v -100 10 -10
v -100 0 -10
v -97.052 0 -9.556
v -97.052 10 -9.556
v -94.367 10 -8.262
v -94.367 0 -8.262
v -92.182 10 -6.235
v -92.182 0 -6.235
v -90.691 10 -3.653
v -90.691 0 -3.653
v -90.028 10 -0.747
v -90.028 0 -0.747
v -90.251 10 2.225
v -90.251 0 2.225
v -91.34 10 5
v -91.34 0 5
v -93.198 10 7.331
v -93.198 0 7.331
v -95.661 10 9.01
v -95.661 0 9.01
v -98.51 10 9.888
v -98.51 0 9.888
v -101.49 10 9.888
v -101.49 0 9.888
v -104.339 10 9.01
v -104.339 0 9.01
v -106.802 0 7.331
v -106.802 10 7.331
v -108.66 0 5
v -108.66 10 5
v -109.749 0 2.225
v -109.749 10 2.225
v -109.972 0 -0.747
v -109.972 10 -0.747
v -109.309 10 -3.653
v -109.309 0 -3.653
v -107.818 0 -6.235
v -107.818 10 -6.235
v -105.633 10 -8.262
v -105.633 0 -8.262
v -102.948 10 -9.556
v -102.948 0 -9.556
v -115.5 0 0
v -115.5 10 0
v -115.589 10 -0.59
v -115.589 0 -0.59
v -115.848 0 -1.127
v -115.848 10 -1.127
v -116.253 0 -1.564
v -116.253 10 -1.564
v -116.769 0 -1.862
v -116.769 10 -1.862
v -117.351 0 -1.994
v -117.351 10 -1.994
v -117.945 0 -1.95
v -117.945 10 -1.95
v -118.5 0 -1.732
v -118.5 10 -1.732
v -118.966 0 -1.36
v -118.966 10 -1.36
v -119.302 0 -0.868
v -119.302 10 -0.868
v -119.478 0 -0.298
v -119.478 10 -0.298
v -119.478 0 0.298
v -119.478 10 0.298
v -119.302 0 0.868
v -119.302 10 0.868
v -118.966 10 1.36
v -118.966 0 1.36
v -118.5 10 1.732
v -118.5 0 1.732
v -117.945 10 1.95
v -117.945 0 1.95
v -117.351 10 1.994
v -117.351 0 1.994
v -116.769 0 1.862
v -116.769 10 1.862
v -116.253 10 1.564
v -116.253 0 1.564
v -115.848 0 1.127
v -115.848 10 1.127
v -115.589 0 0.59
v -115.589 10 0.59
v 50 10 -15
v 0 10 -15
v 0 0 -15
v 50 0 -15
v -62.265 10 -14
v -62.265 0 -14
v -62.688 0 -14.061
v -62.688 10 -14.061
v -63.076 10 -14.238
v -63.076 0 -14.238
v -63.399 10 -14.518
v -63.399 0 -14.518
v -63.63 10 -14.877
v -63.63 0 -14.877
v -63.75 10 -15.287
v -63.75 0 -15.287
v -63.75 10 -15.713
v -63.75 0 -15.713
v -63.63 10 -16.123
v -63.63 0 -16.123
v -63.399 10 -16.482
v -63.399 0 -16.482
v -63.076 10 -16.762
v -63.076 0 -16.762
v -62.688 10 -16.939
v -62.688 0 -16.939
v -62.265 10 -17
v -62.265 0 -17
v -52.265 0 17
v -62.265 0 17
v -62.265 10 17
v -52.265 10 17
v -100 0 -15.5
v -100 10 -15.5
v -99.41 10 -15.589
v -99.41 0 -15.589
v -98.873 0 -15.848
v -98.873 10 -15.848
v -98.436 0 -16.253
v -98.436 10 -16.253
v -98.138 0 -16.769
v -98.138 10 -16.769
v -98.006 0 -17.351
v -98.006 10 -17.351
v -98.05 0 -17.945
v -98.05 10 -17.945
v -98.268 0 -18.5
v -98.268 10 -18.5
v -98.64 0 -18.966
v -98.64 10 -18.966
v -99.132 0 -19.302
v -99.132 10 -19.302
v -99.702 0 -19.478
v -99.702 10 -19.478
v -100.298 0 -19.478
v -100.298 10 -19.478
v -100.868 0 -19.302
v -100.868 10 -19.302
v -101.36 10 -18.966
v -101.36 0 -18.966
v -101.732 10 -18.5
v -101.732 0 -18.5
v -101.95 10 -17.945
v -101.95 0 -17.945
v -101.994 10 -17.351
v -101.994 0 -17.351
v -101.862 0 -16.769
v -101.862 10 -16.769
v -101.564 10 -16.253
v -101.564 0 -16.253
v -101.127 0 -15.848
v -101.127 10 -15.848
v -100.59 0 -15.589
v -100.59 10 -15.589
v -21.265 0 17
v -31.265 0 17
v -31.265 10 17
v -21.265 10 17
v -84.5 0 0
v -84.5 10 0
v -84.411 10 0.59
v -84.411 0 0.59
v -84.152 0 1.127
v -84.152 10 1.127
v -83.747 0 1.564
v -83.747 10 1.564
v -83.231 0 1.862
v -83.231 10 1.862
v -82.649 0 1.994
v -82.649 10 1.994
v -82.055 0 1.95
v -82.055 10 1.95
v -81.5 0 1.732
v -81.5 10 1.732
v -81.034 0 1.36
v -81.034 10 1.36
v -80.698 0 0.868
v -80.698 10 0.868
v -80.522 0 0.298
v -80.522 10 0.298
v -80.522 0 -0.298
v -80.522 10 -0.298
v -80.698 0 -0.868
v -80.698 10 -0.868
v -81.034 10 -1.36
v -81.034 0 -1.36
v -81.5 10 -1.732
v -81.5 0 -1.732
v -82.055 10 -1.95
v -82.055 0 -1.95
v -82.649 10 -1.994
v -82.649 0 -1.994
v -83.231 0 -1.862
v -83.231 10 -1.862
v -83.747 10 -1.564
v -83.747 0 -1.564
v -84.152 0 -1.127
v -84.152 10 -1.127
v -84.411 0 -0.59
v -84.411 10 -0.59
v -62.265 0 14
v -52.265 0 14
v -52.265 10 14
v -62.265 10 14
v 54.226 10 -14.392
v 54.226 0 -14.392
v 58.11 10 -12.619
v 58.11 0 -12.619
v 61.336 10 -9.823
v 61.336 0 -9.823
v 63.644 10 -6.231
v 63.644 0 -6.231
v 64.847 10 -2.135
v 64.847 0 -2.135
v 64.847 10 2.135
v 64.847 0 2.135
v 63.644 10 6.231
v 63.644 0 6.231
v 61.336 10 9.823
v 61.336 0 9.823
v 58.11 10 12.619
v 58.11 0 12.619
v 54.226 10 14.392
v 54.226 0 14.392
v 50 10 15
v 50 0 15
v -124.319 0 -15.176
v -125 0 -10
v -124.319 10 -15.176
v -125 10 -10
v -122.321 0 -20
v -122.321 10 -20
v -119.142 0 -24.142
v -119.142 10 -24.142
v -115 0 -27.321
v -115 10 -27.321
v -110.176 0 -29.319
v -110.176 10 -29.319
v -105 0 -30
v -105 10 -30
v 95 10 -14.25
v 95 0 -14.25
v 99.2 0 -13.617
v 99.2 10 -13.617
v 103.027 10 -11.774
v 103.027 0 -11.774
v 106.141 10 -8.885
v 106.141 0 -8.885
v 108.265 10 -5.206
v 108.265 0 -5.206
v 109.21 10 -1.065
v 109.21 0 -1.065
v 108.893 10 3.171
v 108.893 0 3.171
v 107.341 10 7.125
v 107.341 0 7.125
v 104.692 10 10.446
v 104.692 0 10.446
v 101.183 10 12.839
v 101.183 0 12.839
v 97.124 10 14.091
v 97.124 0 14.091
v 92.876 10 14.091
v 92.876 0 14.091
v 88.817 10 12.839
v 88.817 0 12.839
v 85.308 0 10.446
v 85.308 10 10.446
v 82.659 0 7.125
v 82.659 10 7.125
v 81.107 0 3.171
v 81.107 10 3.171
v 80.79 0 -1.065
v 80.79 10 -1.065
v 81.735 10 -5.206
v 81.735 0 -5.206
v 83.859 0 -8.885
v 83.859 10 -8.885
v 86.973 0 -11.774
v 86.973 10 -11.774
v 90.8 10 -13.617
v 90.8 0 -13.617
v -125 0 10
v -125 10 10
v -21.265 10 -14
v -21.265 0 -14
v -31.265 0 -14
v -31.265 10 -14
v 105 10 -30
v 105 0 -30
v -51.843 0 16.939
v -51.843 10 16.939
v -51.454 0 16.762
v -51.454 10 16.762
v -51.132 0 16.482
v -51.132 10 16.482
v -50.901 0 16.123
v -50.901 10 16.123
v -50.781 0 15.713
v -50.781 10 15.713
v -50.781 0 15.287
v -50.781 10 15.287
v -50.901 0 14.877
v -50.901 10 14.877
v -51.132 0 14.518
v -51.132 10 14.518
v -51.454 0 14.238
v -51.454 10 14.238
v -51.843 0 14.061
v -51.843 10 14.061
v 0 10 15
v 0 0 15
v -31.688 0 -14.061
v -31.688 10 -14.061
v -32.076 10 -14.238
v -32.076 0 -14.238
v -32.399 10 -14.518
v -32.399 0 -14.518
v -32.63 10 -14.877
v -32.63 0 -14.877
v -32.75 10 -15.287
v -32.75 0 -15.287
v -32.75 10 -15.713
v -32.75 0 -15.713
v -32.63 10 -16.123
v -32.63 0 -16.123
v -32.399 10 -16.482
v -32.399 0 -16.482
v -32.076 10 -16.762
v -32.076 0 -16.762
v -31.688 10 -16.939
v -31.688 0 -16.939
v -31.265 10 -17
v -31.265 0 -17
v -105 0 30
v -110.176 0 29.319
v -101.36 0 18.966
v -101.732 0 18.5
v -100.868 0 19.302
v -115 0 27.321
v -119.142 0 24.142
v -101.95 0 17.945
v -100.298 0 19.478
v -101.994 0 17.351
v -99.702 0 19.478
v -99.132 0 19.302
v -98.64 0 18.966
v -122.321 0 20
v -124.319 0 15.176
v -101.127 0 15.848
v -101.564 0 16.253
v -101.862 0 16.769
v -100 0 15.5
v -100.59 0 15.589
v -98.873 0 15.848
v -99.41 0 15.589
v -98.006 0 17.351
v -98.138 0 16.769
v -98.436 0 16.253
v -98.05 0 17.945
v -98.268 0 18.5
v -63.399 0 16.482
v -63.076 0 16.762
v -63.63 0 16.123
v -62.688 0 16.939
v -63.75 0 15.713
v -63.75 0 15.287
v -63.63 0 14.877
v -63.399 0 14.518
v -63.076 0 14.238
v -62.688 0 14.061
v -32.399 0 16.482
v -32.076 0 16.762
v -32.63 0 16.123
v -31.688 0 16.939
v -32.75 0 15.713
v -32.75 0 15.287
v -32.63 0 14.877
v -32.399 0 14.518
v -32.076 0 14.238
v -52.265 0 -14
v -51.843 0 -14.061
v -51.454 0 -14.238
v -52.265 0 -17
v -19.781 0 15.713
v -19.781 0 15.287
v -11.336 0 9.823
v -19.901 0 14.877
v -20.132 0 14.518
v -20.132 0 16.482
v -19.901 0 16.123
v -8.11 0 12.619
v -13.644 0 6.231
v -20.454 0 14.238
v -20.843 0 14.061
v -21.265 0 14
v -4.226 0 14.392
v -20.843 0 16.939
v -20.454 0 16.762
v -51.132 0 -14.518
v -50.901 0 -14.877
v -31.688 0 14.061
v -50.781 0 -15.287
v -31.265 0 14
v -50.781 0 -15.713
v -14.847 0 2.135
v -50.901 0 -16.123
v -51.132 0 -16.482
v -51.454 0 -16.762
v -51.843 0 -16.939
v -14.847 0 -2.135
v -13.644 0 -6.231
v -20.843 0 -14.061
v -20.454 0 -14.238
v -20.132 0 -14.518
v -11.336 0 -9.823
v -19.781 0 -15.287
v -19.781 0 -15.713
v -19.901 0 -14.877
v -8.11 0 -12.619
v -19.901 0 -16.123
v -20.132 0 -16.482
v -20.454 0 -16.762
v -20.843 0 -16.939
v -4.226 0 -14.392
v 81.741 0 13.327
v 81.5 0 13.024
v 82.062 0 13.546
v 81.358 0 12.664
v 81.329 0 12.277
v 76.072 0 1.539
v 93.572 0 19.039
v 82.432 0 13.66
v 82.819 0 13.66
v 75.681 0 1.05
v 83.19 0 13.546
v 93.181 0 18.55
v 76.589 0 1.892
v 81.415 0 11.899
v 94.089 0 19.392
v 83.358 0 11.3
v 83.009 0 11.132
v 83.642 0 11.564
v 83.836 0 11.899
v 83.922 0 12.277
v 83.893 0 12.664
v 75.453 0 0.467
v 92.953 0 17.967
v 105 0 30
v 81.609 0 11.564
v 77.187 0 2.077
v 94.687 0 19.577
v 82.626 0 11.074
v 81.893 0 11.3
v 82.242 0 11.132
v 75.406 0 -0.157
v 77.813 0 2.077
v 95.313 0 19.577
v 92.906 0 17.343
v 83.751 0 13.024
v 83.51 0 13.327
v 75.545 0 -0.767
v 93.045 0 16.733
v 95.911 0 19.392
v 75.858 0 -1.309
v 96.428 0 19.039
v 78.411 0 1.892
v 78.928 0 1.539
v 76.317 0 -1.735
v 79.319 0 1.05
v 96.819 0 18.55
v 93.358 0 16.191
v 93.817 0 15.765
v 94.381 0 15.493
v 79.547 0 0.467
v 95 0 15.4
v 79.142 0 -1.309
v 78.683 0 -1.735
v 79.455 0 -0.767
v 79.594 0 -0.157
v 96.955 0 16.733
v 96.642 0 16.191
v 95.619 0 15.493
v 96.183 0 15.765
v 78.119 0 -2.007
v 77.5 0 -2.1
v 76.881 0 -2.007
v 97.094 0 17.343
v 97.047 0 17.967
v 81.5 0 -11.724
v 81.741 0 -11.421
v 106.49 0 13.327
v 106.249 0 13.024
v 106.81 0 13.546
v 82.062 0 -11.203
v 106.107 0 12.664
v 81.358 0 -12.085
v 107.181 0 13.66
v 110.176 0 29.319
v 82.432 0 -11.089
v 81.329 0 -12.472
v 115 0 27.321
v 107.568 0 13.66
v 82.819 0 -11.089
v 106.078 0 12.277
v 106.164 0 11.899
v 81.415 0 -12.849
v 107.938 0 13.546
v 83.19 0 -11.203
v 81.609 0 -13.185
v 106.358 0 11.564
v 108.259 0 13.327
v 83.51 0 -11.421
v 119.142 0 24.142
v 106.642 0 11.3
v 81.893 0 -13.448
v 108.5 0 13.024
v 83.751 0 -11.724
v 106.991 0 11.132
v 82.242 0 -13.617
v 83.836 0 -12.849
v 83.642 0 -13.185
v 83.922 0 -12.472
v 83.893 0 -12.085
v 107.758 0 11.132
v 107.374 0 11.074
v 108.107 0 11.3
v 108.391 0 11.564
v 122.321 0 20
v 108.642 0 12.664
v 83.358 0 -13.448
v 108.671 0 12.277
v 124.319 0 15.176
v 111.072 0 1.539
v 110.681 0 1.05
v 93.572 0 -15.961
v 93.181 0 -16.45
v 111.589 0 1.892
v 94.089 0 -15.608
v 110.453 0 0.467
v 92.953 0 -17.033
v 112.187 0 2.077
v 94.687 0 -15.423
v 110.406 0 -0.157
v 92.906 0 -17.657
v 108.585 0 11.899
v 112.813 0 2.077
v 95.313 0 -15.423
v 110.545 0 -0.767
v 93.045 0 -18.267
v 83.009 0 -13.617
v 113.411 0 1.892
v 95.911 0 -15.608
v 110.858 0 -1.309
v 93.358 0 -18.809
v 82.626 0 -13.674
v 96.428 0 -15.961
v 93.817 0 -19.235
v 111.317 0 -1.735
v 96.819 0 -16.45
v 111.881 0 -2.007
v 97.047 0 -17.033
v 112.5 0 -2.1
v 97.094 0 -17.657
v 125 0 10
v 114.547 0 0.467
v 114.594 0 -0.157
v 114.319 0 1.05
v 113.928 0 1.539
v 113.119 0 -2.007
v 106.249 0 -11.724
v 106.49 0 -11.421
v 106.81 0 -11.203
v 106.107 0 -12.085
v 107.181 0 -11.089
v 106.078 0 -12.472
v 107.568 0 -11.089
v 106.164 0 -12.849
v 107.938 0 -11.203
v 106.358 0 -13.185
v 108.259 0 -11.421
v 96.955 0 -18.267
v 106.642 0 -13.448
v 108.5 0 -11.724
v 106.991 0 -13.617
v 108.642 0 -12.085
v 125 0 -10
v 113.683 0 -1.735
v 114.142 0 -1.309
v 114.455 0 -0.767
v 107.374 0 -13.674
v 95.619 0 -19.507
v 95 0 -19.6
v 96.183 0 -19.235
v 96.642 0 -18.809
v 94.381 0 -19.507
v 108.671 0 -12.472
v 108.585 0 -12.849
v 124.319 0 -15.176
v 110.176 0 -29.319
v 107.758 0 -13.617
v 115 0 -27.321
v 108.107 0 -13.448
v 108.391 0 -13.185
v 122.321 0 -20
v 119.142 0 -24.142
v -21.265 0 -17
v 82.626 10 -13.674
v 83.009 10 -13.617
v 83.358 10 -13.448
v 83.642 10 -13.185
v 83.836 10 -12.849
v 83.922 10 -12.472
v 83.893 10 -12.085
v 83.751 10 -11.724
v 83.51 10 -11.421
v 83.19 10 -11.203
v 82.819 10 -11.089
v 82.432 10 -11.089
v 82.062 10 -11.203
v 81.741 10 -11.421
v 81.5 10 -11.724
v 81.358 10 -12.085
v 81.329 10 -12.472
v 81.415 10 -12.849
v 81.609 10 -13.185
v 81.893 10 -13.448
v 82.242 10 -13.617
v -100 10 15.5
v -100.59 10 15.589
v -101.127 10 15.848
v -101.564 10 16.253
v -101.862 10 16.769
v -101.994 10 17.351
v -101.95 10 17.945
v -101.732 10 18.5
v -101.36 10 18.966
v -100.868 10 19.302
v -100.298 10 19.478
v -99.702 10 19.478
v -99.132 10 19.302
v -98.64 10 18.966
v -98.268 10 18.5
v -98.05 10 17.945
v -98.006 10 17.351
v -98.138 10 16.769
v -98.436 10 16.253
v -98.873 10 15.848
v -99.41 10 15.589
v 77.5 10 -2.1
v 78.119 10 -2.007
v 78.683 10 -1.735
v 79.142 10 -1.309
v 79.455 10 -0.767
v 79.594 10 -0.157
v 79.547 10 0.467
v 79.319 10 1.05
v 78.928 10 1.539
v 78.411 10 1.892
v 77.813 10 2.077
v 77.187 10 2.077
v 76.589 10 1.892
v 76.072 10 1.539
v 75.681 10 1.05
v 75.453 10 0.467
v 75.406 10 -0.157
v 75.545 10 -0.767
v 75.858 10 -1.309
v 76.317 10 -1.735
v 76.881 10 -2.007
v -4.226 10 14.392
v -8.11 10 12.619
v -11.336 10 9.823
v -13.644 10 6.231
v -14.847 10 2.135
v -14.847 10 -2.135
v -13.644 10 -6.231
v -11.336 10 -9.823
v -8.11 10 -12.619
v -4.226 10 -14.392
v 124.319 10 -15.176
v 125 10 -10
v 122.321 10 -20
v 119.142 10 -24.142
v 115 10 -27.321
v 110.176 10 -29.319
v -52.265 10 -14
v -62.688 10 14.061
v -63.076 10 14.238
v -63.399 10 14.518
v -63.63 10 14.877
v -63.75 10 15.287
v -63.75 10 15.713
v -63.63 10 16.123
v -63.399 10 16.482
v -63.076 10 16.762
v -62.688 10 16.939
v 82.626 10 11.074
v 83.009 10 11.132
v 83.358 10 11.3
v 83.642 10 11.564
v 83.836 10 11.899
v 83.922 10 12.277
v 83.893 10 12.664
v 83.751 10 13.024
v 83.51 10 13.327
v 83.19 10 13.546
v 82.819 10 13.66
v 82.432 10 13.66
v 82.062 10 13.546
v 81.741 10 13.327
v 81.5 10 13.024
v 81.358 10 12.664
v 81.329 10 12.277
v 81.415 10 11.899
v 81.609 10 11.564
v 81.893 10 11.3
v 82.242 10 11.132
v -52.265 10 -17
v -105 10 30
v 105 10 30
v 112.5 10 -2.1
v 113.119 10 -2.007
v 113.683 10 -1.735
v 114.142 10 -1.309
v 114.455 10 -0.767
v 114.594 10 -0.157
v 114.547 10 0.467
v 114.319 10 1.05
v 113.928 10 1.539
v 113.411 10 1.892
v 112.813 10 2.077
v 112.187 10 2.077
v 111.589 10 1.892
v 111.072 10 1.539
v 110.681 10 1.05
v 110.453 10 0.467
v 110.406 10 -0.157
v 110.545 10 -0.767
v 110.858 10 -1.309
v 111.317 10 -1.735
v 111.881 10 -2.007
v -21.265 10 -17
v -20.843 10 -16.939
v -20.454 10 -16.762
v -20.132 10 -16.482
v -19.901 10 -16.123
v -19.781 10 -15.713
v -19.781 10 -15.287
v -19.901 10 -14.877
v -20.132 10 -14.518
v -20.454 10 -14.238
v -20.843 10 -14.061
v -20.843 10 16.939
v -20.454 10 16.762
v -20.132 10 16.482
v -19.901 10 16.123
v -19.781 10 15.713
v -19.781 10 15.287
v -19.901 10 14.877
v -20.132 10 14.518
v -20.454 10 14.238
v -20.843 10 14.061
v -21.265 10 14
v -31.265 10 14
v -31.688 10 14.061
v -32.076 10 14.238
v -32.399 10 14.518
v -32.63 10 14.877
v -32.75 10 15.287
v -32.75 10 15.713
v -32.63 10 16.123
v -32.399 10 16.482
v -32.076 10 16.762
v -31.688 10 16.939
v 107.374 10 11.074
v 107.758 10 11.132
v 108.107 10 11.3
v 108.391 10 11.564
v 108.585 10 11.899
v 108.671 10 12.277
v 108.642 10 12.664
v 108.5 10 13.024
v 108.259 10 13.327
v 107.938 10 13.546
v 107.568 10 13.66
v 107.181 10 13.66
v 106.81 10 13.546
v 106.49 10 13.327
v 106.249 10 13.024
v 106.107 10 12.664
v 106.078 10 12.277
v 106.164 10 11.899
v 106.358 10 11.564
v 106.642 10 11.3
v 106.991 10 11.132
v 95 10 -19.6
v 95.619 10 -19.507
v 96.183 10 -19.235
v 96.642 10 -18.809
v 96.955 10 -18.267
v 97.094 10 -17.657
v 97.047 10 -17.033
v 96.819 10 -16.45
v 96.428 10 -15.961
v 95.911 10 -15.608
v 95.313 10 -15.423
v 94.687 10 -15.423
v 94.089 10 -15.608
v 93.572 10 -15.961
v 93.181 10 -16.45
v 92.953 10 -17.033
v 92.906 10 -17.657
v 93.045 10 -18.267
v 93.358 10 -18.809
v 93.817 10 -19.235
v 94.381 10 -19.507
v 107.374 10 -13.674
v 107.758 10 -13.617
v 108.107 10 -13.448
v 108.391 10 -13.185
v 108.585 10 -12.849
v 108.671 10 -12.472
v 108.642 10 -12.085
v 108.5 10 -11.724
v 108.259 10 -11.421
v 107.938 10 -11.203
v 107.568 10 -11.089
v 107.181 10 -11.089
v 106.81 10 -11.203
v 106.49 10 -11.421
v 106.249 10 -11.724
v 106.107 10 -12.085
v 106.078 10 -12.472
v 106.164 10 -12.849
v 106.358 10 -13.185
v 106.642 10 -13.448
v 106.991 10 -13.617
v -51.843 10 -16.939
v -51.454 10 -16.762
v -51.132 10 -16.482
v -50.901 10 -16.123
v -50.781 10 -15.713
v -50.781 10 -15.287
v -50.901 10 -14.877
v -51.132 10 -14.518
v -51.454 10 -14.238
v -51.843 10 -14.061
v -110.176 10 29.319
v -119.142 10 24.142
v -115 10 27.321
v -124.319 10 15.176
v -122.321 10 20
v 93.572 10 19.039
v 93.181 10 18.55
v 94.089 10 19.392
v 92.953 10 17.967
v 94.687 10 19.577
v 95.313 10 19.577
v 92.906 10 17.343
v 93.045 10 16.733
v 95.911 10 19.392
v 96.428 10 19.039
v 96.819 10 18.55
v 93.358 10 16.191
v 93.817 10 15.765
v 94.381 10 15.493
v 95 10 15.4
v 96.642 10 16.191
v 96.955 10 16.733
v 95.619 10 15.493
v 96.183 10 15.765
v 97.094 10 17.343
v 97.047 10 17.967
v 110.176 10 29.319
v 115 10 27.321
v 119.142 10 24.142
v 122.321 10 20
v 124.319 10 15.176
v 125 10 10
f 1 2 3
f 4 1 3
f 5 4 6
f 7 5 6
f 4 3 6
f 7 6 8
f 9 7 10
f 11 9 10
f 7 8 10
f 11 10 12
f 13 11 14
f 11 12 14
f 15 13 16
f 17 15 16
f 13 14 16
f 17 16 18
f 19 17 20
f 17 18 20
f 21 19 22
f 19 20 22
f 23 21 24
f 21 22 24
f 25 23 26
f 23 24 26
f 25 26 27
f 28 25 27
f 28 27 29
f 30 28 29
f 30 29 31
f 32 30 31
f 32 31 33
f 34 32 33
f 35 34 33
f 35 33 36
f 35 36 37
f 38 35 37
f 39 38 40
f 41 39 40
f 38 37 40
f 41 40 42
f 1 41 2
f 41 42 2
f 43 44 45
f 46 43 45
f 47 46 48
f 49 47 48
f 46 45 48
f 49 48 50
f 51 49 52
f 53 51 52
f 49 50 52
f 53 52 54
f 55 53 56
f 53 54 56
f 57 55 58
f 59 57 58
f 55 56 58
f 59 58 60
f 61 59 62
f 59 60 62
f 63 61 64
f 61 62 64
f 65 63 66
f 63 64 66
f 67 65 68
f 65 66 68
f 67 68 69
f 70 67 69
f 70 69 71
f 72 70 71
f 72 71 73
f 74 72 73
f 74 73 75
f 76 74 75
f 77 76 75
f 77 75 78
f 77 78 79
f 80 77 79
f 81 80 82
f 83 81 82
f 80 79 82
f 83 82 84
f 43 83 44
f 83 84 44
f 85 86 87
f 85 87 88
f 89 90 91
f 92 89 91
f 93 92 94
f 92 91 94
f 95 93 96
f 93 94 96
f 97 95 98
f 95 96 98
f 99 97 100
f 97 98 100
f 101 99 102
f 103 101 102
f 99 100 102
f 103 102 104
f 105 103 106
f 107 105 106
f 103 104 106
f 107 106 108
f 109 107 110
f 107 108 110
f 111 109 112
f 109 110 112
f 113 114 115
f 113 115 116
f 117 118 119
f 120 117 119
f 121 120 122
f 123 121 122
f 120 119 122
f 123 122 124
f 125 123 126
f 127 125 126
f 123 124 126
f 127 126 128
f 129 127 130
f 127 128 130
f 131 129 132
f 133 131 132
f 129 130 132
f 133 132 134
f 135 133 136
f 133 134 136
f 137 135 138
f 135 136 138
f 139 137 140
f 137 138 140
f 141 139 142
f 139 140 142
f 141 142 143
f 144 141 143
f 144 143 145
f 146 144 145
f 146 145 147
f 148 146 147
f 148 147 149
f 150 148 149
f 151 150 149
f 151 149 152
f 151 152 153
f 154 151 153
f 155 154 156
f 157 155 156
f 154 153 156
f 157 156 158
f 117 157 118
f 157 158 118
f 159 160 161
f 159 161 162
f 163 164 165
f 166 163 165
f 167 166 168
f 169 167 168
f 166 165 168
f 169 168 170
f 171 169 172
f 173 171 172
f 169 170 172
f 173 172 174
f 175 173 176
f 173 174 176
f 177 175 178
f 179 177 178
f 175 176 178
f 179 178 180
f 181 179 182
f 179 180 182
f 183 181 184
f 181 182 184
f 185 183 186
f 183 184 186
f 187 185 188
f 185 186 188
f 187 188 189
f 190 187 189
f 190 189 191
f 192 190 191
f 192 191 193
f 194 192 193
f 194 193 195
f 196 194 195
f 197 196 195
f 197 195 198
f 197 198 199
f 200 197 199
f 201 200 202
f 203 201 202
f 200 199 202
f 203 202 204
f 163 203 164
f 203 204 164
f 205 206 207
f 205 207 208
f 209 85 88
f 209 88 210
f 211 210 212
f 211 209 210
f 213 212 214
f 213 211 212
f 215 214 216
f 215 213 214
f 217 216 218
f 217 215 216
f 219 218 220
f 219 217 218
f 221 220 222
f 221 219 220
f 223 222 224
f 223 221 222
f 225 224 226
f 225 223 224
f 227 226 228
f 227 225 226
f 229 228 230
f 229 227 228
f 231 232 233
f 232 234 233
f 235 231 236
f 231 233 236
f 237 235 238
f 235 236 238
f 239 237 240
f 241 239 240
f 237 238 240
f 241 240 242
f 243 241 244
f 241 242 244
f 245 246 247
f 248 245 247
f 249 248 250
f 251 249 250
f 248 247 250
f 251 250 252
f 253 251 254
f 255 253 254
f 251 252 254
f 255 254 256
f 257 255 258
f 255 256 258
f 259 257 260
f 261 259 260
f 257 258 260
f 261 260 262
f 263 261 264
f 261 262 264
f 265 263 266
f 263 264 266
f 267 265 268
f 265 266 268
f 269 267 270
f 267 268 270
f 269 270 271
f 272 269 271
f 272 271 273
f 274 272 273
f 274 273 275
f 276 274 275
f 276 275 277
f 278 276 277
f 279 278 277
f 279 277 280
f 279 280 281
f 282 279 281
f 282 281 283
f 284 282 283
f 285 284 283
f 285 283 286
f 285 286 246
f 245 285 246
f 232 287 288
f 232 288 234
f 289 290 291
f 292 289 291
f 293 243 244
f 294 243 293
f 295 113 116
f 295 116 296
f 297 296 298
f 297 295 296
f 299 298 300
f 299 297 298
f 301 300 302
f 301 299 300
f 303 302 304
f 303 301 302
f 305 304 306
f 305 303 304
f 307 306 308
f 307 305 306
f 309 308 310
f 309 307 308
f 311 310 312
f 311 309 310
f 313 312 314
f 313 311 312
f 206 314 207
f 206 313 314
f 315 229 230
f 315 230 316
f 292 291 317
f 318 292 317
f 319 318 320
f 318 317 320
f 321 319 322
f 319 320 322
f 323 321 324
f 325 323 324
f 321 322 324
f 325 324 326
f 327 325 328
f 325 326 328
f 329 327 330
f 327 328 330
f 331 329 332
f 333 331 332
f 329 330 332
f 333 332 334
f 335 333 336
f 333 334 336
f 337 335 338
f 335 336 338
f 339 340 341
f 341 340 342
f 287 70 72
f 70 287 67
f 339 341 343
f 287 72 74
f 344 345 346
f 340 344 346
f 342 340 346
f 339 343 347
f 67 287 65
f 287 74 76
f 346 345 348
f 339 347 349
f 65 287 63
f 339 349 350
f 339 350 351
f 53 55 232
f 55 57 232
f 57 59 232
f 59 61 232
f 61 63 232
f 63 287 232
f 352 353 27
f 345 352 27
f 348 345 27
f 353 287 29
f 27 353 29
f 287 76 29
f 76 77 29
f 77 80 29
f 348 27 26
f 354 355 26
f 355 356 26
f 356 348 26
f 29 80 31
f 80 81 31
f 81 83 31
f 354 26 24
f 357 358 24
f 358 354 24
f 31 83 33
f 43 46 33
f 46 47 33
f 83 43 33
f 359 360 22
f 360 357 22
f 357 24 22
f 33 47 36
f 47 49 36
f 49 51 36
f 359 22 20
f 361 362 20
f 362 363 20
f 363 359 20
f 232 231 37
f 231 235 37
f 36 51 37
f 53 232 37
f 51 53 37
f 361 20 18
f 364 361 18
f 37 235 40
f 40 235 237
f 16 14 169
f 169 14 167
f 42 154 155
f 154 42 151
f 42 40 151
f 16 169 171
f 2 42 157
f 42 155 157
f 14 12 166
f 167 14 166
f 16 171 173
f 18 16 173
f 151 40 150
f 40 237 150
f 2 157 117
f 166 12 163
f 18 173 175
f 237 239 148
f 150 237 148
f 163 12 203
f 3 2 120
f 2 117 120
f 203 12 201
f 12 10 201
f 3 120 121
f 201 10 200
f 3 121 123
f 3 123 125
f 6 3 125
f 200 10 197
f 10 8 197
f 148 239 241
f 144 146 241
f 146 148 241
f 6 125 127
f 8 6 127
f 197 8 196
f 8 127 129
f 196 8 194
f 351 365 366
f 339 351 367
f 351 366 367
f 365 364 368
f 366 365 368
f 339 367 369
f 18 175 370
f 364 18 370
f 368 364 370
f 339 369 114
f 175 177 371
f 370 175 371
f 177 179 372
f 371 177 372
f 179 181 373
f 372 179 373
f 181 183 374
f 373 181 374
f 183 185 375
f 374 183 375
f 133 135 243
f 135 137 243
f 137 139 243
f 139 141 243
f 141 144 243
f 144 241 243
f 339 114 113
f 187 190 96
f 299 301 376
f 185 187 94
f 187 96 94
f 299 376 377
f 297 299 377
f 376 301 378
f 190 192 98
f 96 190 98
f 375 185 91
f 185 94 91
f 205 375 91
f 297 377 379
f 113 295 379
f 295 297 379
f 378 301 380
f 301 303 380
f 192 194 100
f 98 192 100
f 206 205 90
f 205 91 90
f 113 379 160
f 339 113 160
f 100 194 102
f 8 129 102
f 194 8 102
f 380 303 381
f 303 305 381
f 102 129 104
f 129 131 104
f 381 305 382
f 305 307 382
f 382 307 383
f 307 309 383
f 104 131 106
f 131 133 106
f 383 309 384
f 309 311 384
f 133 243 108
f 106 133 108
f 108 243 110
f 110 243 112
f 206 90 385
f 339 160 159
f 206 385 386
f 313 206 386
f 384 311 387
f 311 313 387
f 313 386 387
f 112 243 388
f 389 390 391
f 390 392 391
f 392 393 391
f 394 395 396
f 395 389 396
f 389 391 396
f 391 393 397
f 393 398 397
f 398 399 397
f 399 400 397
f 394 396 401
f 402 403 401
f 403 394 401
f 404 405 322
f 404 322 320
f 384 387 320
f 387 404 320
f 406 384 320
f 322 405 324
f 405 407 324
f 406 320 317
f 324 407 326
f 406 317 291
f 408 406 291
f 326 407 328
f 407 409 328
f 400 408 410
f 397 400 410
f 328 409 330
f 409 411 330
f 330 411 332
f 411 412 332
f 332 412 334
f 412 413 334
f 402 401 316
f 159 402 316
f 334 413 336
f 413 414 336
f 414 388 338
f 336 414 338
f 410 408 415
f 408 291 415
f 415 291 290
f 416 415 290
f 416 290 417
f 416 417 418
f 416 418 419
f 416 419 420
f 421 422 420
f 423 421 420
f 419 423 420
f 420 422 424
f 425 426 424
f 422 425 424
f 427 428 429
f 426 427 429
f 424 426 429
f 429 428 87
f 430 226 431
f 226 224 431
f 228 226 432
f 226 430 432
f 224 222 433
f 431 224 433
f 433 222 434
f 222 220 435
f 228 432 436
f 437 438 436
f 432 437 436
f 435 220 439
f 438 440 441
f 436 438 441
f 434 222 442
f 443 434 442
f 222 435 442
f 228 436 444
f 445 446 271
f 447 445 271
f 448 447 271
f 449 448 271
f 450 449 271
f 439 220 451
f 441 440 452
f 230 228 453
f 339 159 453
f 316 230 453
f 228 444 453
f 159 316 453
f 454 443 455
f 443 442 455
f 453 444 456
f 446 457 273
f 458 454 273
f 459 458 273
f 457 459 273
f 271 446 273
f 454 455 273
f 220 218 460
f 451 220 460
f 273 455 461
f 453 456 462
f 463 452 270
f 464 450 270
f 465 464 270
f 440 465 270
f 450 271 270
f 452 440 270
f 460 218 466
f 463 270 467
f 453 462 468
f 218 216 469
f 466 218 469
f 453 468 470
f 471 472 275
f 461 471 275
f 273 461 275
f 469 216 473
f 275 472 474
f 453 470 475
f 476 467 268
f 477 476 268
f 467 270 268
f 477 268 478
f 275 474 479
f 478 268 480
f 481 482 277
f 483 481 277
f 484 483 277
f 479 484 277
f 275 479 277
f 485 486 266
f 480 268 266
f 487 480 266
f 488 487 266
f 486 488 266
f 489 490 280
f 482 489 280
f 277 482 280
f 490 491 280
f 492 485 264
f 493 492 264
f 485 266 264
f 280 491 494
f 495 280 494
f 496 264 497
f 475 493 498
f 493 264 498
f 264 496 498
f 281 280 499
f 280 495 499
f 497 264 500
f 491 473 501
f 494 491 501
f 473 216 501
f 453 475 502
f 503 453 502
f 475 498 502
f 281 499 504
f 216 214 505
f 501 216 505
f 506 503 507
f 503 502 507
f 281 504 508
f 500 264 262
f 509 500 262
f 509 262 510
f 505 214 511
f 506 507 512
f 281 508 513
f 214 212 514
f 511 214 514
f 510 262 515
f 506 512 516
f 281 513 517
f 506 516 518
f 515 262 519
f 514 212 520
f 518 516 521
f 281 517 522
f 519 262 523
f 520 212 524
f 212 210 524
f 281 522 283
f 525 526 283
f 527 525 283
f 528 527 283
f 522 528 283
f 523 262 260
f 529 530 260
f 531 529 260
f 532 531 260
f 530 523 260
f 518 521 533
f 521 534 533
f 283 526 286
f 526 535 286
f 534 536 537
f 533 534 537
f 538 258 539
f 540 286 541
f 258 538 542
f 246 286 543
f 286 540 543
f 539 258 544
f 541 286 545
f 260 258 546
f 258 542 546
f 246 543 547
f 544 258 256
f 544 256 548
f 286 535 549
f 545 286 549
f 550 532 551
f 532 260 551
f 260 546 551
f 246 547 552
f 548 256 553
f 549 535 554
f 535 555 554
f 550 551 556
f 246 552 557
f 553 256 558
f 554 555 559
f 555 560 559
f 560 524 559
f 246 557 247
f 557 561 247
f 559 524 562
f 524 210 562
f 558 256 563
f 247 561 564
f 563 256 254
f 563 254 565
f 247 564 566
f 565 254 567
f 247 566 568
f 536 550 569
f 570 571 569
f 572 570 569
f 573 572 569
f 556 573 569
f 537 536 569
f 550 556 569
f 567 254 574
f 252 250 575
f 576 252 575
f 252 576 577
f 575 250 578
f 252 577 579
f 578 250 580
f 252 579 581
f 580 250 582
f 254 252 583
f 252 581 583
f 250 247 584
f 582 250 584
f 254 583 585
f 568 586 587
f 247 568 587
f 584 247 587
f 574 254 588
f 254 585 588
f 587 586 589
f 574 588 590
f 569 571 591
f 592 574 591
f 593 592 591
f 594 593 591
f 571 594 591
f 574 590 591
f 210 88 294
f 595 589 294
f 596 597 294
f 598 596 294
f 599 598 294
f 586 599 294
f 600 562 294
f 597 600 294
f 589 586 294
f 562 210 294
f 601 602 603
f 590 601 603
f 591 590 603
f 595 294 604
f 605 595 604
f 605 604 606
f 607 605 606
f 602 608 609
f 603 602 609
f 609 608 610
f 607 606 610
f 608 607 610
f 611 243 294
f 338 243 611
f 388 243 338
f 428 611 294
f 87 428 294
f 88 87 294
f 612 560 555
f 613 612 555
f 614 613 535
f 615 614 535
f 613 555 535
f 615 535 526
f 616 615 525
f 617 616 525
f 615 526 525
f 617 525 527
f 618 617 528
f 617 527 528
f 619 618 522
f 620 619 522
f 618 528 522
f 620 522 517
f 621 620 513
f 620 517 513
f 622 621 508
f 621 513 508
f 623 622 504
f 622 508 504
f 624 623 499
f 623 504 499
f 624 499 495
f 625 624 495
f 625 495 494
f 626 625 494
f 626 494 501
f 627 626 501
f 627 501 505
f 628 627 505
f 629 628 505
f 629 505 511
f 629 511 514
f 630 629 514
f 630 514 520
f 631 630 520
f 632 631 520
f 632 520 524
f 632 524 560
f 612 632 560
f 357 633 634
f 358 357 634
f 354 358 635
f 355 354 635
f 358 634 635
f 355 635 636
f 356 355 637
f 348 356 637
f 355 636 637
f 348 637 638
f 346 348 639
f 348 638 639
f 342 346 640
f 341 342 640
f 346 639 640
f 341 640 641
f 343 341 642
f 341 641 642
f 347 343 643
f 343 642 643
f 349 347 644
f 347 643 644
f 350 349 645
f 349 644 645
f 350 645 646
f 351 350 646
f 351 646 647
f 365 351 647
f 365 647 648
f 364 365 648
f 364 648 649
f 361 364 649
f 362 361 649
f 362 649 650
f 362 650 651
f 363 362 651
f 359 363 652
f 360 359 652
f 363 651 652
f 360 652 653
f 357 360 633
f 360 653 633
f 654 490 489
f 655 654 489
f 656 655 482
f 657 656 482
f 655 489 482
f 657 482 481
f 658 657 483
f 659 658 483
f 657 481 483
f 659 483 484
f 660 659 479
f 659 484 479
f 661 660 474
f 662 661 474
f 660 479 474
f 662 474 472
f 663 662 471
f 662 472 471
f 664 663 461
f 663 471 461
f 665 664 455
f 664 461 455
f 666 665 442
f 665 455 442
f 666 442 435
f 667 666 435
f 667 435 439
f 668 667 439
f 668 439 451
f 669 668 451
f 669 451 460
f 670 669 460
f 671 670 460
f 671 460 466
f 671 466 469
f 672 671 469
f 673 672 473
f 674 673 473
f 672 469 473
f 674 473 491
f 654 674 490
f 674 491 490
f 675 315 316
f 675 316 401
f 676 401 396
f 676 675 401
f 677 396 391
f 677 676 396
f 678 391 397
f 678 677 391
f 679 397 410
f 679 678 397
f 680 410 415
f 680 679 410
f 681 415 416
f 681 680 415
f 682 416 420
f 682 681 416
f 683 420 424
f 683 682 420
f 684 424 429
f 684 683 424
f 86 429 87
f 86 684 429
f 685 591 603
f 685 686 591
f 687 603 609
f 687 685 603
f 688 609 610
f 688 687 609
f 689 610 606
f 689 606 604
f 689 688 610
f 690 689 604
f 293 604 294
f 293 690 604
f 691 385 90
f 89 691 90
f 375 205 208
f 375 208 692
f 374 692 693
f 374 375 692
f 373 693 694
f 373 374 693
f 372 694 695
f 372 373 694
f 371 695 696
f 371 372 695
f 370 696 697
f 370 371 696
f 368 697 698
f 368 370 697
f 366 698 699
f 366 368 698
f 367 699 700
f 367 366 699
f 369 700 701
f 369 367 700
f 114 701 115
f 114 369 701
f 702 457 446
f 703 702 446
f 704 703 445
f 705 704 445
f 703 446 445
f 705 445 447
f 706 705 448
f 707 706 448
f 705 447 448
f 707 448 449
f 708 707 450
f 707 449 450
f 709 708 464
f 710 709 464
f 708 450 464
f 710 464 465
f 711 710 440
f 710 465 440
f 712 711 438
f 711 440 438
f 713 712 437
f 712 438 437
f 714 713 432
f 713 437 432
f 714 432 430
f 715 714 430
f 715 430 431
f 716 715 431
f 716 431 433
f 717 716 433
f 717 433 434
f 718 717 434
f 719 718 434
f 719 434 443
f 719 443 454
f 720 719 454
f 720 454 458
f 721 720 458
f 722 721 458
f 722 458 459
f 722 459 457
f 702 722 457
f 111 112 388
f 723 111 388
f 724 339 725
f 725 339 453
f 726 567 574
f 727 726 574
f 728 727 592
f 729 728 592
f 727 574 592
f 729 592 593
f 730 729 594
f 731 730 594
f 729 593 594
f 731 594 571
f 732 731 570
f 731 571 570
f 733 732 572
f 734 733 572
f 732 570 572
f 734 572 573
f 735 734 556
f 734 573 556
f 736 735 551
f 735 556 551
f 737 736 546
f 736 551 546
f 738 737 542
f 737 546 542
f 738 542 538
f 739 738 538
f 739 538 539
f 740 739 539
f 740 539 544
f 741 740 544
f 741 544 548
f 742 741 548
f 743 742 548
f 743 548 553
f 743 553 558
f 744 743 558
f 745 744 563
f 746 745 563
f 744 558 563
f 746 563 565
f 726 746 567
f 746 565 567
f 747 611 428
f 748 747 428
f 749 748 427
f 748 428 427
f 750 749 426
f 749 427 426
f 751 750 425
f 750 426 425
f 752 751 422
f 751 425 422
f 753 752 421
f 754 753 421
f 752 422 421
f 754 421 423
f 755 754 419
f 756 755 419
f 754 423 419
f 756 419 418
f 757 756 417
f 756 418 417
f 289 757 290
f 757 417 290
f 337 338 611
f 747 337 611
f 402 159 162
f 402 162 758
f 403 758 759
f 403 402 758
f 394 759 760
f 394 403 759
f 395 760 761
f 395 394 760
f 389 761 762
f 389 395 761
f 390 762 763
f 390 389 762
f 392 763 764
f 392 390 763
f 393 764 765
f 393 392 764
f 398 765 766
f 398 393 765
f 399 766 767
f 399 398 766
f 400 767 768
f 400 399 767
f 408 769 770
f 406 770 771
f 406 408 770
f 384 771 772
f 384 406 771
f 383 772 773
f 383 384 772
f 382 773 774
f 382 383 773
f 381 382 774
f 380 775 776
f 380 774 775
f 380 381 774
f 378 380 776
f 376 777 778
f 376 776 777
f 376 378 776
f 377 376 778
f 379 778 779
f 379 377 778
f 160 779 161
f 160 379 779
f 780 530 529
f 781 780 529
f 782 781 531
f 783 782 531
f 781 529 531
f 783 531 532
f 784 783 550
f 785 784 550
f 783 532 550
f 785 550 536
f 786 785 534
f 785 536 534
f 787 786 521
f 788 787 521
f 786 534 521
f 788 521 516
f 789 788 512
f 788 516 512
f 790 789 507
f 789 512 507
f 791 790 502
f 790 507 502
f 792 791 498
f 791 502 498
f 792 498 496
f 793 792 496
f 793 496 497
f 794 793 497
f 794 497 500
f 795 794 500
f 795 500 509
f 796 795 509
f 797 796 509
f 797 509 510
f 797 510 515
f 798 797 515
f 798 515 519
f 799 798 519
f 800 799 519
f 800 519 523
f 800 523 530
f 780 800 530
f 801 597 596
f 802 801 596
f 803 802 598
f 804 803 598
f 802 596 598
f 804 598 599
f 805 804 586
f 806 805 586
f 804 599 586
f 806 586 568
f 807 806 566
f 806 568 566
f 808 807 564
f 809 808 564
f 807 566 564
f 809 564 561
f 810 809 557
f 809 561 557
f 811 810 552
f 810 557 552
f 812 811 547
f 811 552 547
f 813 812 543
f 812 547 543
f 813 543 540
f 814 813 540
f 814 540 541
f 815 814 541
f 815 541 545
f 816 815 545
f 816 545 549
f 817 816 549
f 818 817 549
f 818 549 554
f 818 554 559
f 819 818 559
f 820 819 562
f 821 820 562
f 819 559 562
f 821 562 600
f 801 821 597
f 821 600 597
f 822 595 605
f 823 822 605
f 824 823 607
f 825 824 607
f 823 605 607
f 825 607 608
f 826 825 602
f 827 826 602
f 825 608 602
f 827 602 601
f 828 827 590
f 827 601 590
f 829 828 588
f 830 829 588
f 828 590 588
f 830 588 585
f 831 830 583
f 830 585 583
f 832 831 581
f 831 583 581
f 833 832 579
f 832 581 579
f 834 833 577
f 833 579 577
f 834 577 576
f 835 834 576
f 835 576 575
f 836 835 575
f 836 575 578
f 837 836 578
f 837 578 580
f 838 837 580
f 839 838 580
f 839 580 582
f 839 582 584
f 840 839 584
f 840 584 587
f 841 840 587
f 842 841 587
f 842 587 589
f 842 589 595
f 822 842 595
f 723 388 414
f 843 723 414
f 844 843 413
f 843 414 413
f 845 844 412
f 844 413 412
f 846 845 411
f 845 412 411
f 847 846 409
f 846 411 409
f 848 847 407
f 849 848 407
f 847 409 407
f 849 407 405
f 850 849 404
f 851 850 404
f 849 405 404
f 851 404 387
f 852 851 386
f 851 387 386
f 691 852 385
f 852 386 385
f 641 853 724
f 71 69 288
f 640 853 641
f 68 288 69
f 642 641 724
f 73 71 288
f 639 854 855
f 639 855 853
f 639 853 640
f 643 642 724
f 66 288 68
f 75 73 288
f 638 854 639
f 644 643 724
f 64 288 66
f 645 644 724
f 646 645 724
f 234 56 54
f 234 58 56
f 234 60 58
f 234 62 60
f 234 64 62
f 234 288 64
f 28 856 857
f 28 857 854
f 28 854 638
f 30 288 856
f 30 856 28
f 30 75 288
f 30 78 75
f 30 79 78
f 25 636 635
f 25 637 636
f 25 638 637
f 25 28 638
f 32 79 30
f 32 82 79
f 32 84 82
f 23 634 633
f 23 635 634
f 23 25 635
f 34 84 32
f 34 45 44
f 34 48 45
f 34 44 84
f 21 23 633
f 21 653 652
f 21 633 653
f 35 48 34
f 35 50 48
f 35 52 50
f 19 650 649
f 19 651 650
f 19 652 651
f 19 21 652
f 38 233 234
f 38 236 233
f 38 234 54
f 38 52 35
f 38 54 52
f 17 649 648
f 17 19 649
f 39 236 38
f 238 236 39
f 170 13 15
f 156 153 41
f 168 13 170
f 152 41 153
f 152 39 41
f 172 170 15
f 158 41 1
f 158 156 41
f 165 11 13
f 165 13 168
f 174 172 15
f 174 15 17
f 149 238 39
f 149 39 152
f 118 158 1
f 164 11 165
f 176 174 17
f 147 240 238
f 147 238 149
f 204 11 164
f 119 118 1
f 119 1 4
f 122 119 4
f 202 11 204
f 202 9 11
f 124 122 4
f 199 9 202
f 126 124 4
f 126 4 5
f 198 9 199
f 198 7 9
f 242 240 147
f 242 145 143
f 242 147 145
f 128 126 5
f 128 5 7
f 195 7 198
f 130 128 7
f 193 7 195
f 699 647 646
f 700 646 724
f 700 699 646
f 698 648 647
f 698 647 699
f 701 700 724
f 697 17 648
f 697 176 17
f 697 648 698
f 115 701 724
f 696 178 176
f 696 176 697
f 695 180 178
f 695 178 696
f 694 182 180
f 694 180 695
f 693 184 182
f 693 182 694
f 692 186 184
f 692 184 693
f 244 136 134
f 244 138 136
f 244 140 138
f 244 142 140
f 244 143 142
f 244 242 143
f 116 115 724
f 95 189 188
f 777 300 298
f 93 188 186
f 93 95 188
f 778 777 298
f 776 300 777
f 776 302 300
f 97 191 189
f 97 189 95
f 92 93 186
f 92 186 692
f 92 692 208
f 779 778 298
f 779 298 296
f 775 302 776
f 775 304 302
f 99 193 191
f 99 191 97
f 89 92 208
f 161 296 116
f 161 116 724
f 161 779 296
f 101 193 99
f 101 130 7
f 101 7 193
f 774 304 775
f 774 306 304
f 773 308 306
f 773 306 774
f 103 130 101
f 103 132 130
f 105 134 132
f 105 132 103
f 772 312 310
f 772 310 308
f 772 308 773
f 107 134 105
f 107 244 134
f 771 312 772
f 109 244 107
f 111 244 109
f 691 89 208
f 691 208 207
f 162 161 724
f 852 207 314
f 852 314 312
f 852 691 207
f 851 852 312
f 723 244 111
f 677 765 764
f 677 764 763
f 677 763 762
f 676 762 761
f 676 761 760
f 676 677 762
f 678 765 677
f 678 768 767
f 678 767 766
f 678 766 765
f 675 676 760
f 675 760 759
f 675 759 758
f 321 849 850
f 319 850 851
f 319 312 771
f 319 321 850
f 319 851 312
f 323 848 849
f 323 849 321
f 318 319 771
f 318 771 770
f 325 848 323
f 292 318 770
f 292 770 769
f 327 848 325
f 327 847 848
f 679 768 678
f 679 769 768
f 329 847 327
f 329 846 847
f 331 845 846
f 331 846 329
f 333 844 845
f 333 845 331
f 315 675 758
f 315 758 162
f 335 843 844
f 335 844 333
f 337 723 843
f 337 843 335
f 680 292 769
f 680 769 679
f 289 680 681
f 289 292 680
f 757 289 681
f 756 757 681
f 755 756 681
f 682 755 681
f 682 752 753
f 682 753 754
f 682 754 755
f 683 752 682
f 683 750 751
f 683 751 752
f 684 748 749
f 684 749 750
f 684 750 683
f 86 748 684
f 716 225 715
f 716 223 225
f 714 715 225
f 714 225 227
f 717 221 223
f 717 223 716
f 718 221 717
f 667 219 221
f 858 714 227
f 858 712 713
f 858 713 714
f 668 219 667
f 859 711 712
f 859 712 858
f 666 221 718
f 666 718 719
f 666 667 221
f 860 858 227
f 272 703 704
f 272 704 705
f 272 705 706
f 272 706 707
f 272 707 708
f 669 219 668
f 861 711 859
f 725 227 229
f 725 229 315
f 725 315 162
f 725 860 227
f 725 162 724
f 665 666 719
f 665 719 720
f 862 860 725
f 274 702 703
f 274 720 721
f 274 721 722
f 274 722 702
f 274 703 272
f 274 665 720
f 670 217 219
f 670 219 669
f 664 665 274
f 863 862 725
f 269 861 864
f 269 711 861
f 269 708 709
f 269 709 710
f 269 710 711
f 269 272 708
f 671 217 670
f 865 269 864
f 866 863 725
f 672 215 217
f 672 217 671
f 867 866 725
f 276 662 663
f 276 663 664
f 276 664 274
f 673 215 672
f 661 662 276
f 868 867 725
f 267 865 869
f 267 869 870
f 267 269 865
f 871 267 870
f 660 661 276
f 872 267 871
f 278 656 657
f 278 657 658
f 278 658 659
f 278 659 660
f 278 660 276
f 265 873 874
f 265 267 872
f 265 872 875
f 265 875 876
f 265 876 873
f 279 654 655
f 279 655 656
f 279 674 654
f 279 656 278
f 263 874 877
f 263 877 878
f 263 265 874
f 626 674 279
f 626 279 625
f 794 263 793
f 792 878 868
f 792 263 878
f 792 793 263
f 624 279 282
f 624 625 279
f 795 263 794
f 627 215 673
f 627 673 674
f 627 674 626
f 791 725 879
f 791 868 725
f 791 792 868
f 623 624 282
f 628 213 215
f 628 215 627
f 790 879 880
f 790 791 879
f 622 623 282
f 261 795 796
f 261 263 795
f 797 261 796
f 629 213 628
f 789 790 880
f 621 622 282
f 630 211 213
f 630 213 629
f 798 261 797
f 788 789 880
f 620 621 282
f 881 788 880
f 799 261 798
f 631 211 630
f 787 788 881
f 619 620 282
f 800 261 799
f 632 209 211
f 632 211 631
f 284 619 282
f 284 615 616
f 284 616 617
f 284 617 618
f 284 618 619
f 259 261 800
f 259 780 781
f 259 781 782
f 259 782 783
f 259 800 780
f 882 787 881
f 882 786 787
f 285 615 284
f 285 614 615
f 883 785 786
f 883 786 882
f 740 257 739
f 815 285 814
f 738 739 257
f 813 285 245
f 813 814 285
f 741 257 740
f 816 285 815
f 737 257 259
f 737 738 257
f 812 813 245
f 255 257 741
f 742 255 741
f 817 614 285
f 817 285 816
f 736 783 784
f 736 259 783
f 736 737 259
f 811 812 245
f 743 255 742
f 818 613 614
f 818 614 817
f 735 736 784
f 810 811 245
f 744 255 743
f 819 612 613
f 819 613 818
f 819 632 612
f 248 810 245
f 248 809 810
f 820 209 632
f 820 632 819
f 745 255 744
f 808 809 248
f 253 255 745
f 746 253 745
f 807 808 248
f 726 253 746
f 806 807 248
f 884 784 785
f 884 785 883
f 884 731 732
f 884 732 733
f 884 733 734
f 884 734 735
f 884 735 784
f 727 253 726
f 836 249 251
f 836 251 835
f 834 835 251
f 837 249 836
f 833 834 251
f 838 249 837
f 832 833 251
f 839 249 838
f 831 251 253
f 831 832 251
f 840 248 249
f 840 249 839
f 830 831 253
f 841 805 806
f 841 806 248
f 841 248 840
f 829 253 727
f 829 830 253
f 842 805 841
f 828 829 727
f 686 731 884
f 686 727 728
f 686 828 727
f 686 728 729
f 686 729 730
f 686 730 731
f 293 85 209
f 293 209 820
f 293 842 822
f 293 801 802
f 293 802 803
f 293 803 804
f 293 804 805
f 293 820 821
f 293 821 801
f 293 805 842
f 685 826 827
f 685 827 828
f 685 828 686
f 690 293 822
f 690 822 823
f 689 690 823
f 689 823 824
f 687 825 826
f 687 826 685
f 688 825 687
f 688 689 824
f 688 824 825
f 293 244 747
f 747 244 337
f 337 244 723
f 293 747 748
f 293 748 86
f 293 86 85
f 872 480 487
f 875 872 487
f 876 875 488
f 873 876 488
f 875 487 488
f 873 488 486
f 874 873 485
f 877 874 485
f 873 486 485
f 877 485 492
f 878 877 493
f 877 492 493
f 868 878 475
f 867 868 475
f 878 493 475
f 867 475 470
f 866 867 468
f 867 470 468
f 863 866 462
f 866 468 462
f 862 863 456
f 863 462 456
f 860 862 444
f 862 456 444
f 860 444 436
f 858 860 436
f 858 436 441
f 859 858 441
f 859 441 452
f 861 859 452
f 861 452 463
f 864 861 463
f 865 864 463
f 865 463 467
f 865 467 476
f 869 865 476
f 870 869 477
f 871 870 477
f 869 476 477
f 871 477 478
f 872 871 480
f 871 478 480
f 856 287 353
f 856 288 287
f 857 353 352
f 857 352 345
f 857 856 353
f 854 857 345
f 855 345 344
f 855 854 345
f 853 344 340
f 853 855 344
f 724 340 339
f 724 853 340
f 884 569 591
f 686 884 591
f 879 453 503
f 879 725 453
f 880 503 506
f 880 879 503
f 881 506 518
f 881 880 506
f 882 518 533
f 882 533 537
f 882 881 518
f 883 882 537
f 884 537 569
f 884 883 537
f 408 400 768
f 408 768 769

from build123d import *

# Parameters (mm, degrees)
SKETCH_1_W               = 250
SKETCH_1_H               = 60
EXTRUDE_1_DEPTH          = 10
FILLET_1_R               = 20
SKETCH_5_R               = 10
CUT_EXTRUDE_3_DEPTH      = 10
SKETCH_15_R              = 14.25
CUT_EXTRUDE_12_DEPTH     = 129.937969582
SKETCH_18_R              = 1.3
CUT_EXTRUDE_14_DEPTH     = 129.937969582
CUT_EXTRUDE_15_DEPTH     = 129.937969582
SKETCH_20_R              = 2
CUT_EXTRUDE_16_DEPTH     = 10
SKETCH_21_R              = 2.1
CUT_EXTRUDE_17_DEPTH     = 10
CUT_EXTRUDE_18_DEPTH     = 129.937969582
PATTERN_CIRCULAR_1_COUNT = 4


with BuildPart() as part:
    # 草图1 → 凸台-拉伸1 (new body)
    with BuildSketch(Plane(origin=(0, 0, 0), x_dir=(1, 0, 0), z_dir=(0, 1, 0))):
        Rectangle(SKETCH_1_W, SKETCH_1_H)
    extrude(amount=EXTRUDE_1_DEPTH)

    # 圆角1
    fillet_1_edges = [part.edges().sort_by_distance(p)[0] for p in [
        (125, 5, 30),
        (-125, 5, 30),
        (-125, 5, -30),
        (125, 5, -30),
    ]]
    fillet(fillet_1_edges, radius=FILLET_1_R)

    # 草图5 → 切除-拉伸3 (cut)
    with BuildSketch(Plane.XZ):
        with Locations(Location((-100, 0, 0), (0, 0, 270))):
            Circle(SKETCH_5_R)
    extrude(amount=-CUT_EXTRUDE_3_DEPTH, mode=Mode.SUBTRACT)

    # 草图15 → 切除-拉伸12 (cut, through all)
    with BuildSketch(Plane.XZ):
        with Locations(Location((95, 0, 0), (0, 0, 270))):
            Circle(SKETCH_15_R)
    extrude(amount=-CUT_EXTRUDE_12_DEPTH, mode=Mode.SUBTRACT)

    # 草图18 → 切除-拉伸14 (cut, through all)
    with BuildSketch(Plane.XZ):
        with Locations(Location((82.625631329, 12.374368671, 0), (0, 0, 270))):
            Circle(SKETCH_18_R)
        with Locations(Location((107.374368671, 12.374368671, 0), (0, 0, 270))):
            Circle(SKETCH_18_R)
        with Locations(Location((107.374368671, -12.374368671, 0), (0, 0, 270))):
            Circle(SKETCH_18_R)
        with Locations(Location((82.625631329, -12.374368671, 0), (0, 0, 270))):
            Circle(SKETCH_18_R)
    extrude(amount=-CUT_EXTRUDE_14_DEPTH, mode=Mode.SUBTRACT)

    # 草图19 → 切除-拉伸15 (cut, through all)
    with BuildSketch(Plane(origin=(0, 0, 0), x_dir=(-1, 0, 0), z_dir=(0, -1, 0))):
        with BuildLine():
            Line((62.26537952, 17), (52.26537952, 17))
            ThreePointArc((52.26537952, 17), (50.76537952, 15.5), (52.26537952, 14))
            Line((52.26537952, 14), (62.26537952, 14))
            ThreePointArc((62.26537952, 14), (63.76537952, 15.5), (62.26537952, 17))
        make_face()
        with BuildLine():
            Line((31.26537952, -17), (21.26537952, -17))
            ThreePointArc((21.26537952, -17), (19.76537952, -15.5), (21.26537952, -14))
            Line((21.26537952, -14), (31.26537952, -14))
            ThreePointArc((31.26537952, -14), (32.76537952, -15.5), (31.26537952, -17))
        make_face()
        with BuildLine():
            Line((31.26537952, 17), (21.26537952, 17))
            ThreePointArc((21.26537952, 17), (19.76537952, 15.5), (21.26537952, 14))
            Line((21.26537952, 14), (31.26537952, 14))
            ThreePointArc((31.26537952, 14), (32.76537952, 15.5), (31.26537952, 17))
        make_face()
        with BuildLine():
            Line((62.26537952, -17), (52.26537952, -17))
            ThreePointArc((52.26537952, -17), (50.76537952, -15.5), (52.26537952, -14))
            Line((52.26537952, -14), (62.26537952, -14))
            ThreePointArc((62.26537952, -14), (63.76537952, -15.5), (62.26537952, -17))
        make_face()
    extrude(amount=-CUT_EXTRUDE_15_DEPTH, mode=Mode.SUBTRACT)

    # 草图20 → 切除-拉伸16 (cut)
    with BuildSketch(Plane(origin=(0, 10, 0), x_dir=(1, 0, 0), z_dir=(0, 1, 0))):
        with Locations(Location((-100, 17.5, 0), (0, 0, 270))):
            Circle(SKETCH_20_R)
    cut_extrude_16 = extrude(amount=-CUT_EXTRUDE_16_DEPTH, mode=Mode.SUBTRACT)

    # 草图21 → 切除-拉伸17 (cut)
    with BuildSketch(Plane.XZ):
        with Locations(Location((95, 17.5, 0), (0, 0, 270))):
            Circle(SKETCH_21_R)
        with Locations(Location((112.5, 0, 0), (0, 0, 270))):
            Circle(SKETCH_21_R)
        with Locations(Location((95, -17.5, 0), (0, 0, 270))):
            Circle(SKETCH_21_R)
        with Locations(Location((77.5, 0, 0), (0, 0, 270))):
            Circle(SKETCH_21_R)
    extrude(amount=-CUT_EXTRUDE_17_DEPTH, mode=Mode.SUBTRACT)

    # 草图22 → 切除-拉伸18 (cut, through all)
    with BuildSketch(Plane(origin=(0, 10, 0), x_dir=(1, 0, 0), z_dir=(0, 1, 0))):
        with BuildLine():
            Line((0, 15), (50, 15))
            ThreePointArc((50, 15), (65, 0), (50, -15))
            Line((50, -15), (0, -15))
            ThreePointArc((0, -15), (-15, 0), (0, 15))
        make_face()
    extrude(amount=-CUT_EXTRUDE_18_DEPTH, mode=Mode.SUBTRACT)

    # 阵列(圆周)1: 切除-拉伸16 ×4 about axis
    pattern_circular_1_axis = Axis((-100, 0, 0), (0, 1, 0))
    for i in range(1, PATTERN_CIRCULAR_1_COUNT):
        add(cut_extrude_16.rotate(pattern_circular_1_axis, i * 360 / PATTERN_CIRCULAR_1_COUNT), mode=Mode.SUBTRACT)


solid = part.part
